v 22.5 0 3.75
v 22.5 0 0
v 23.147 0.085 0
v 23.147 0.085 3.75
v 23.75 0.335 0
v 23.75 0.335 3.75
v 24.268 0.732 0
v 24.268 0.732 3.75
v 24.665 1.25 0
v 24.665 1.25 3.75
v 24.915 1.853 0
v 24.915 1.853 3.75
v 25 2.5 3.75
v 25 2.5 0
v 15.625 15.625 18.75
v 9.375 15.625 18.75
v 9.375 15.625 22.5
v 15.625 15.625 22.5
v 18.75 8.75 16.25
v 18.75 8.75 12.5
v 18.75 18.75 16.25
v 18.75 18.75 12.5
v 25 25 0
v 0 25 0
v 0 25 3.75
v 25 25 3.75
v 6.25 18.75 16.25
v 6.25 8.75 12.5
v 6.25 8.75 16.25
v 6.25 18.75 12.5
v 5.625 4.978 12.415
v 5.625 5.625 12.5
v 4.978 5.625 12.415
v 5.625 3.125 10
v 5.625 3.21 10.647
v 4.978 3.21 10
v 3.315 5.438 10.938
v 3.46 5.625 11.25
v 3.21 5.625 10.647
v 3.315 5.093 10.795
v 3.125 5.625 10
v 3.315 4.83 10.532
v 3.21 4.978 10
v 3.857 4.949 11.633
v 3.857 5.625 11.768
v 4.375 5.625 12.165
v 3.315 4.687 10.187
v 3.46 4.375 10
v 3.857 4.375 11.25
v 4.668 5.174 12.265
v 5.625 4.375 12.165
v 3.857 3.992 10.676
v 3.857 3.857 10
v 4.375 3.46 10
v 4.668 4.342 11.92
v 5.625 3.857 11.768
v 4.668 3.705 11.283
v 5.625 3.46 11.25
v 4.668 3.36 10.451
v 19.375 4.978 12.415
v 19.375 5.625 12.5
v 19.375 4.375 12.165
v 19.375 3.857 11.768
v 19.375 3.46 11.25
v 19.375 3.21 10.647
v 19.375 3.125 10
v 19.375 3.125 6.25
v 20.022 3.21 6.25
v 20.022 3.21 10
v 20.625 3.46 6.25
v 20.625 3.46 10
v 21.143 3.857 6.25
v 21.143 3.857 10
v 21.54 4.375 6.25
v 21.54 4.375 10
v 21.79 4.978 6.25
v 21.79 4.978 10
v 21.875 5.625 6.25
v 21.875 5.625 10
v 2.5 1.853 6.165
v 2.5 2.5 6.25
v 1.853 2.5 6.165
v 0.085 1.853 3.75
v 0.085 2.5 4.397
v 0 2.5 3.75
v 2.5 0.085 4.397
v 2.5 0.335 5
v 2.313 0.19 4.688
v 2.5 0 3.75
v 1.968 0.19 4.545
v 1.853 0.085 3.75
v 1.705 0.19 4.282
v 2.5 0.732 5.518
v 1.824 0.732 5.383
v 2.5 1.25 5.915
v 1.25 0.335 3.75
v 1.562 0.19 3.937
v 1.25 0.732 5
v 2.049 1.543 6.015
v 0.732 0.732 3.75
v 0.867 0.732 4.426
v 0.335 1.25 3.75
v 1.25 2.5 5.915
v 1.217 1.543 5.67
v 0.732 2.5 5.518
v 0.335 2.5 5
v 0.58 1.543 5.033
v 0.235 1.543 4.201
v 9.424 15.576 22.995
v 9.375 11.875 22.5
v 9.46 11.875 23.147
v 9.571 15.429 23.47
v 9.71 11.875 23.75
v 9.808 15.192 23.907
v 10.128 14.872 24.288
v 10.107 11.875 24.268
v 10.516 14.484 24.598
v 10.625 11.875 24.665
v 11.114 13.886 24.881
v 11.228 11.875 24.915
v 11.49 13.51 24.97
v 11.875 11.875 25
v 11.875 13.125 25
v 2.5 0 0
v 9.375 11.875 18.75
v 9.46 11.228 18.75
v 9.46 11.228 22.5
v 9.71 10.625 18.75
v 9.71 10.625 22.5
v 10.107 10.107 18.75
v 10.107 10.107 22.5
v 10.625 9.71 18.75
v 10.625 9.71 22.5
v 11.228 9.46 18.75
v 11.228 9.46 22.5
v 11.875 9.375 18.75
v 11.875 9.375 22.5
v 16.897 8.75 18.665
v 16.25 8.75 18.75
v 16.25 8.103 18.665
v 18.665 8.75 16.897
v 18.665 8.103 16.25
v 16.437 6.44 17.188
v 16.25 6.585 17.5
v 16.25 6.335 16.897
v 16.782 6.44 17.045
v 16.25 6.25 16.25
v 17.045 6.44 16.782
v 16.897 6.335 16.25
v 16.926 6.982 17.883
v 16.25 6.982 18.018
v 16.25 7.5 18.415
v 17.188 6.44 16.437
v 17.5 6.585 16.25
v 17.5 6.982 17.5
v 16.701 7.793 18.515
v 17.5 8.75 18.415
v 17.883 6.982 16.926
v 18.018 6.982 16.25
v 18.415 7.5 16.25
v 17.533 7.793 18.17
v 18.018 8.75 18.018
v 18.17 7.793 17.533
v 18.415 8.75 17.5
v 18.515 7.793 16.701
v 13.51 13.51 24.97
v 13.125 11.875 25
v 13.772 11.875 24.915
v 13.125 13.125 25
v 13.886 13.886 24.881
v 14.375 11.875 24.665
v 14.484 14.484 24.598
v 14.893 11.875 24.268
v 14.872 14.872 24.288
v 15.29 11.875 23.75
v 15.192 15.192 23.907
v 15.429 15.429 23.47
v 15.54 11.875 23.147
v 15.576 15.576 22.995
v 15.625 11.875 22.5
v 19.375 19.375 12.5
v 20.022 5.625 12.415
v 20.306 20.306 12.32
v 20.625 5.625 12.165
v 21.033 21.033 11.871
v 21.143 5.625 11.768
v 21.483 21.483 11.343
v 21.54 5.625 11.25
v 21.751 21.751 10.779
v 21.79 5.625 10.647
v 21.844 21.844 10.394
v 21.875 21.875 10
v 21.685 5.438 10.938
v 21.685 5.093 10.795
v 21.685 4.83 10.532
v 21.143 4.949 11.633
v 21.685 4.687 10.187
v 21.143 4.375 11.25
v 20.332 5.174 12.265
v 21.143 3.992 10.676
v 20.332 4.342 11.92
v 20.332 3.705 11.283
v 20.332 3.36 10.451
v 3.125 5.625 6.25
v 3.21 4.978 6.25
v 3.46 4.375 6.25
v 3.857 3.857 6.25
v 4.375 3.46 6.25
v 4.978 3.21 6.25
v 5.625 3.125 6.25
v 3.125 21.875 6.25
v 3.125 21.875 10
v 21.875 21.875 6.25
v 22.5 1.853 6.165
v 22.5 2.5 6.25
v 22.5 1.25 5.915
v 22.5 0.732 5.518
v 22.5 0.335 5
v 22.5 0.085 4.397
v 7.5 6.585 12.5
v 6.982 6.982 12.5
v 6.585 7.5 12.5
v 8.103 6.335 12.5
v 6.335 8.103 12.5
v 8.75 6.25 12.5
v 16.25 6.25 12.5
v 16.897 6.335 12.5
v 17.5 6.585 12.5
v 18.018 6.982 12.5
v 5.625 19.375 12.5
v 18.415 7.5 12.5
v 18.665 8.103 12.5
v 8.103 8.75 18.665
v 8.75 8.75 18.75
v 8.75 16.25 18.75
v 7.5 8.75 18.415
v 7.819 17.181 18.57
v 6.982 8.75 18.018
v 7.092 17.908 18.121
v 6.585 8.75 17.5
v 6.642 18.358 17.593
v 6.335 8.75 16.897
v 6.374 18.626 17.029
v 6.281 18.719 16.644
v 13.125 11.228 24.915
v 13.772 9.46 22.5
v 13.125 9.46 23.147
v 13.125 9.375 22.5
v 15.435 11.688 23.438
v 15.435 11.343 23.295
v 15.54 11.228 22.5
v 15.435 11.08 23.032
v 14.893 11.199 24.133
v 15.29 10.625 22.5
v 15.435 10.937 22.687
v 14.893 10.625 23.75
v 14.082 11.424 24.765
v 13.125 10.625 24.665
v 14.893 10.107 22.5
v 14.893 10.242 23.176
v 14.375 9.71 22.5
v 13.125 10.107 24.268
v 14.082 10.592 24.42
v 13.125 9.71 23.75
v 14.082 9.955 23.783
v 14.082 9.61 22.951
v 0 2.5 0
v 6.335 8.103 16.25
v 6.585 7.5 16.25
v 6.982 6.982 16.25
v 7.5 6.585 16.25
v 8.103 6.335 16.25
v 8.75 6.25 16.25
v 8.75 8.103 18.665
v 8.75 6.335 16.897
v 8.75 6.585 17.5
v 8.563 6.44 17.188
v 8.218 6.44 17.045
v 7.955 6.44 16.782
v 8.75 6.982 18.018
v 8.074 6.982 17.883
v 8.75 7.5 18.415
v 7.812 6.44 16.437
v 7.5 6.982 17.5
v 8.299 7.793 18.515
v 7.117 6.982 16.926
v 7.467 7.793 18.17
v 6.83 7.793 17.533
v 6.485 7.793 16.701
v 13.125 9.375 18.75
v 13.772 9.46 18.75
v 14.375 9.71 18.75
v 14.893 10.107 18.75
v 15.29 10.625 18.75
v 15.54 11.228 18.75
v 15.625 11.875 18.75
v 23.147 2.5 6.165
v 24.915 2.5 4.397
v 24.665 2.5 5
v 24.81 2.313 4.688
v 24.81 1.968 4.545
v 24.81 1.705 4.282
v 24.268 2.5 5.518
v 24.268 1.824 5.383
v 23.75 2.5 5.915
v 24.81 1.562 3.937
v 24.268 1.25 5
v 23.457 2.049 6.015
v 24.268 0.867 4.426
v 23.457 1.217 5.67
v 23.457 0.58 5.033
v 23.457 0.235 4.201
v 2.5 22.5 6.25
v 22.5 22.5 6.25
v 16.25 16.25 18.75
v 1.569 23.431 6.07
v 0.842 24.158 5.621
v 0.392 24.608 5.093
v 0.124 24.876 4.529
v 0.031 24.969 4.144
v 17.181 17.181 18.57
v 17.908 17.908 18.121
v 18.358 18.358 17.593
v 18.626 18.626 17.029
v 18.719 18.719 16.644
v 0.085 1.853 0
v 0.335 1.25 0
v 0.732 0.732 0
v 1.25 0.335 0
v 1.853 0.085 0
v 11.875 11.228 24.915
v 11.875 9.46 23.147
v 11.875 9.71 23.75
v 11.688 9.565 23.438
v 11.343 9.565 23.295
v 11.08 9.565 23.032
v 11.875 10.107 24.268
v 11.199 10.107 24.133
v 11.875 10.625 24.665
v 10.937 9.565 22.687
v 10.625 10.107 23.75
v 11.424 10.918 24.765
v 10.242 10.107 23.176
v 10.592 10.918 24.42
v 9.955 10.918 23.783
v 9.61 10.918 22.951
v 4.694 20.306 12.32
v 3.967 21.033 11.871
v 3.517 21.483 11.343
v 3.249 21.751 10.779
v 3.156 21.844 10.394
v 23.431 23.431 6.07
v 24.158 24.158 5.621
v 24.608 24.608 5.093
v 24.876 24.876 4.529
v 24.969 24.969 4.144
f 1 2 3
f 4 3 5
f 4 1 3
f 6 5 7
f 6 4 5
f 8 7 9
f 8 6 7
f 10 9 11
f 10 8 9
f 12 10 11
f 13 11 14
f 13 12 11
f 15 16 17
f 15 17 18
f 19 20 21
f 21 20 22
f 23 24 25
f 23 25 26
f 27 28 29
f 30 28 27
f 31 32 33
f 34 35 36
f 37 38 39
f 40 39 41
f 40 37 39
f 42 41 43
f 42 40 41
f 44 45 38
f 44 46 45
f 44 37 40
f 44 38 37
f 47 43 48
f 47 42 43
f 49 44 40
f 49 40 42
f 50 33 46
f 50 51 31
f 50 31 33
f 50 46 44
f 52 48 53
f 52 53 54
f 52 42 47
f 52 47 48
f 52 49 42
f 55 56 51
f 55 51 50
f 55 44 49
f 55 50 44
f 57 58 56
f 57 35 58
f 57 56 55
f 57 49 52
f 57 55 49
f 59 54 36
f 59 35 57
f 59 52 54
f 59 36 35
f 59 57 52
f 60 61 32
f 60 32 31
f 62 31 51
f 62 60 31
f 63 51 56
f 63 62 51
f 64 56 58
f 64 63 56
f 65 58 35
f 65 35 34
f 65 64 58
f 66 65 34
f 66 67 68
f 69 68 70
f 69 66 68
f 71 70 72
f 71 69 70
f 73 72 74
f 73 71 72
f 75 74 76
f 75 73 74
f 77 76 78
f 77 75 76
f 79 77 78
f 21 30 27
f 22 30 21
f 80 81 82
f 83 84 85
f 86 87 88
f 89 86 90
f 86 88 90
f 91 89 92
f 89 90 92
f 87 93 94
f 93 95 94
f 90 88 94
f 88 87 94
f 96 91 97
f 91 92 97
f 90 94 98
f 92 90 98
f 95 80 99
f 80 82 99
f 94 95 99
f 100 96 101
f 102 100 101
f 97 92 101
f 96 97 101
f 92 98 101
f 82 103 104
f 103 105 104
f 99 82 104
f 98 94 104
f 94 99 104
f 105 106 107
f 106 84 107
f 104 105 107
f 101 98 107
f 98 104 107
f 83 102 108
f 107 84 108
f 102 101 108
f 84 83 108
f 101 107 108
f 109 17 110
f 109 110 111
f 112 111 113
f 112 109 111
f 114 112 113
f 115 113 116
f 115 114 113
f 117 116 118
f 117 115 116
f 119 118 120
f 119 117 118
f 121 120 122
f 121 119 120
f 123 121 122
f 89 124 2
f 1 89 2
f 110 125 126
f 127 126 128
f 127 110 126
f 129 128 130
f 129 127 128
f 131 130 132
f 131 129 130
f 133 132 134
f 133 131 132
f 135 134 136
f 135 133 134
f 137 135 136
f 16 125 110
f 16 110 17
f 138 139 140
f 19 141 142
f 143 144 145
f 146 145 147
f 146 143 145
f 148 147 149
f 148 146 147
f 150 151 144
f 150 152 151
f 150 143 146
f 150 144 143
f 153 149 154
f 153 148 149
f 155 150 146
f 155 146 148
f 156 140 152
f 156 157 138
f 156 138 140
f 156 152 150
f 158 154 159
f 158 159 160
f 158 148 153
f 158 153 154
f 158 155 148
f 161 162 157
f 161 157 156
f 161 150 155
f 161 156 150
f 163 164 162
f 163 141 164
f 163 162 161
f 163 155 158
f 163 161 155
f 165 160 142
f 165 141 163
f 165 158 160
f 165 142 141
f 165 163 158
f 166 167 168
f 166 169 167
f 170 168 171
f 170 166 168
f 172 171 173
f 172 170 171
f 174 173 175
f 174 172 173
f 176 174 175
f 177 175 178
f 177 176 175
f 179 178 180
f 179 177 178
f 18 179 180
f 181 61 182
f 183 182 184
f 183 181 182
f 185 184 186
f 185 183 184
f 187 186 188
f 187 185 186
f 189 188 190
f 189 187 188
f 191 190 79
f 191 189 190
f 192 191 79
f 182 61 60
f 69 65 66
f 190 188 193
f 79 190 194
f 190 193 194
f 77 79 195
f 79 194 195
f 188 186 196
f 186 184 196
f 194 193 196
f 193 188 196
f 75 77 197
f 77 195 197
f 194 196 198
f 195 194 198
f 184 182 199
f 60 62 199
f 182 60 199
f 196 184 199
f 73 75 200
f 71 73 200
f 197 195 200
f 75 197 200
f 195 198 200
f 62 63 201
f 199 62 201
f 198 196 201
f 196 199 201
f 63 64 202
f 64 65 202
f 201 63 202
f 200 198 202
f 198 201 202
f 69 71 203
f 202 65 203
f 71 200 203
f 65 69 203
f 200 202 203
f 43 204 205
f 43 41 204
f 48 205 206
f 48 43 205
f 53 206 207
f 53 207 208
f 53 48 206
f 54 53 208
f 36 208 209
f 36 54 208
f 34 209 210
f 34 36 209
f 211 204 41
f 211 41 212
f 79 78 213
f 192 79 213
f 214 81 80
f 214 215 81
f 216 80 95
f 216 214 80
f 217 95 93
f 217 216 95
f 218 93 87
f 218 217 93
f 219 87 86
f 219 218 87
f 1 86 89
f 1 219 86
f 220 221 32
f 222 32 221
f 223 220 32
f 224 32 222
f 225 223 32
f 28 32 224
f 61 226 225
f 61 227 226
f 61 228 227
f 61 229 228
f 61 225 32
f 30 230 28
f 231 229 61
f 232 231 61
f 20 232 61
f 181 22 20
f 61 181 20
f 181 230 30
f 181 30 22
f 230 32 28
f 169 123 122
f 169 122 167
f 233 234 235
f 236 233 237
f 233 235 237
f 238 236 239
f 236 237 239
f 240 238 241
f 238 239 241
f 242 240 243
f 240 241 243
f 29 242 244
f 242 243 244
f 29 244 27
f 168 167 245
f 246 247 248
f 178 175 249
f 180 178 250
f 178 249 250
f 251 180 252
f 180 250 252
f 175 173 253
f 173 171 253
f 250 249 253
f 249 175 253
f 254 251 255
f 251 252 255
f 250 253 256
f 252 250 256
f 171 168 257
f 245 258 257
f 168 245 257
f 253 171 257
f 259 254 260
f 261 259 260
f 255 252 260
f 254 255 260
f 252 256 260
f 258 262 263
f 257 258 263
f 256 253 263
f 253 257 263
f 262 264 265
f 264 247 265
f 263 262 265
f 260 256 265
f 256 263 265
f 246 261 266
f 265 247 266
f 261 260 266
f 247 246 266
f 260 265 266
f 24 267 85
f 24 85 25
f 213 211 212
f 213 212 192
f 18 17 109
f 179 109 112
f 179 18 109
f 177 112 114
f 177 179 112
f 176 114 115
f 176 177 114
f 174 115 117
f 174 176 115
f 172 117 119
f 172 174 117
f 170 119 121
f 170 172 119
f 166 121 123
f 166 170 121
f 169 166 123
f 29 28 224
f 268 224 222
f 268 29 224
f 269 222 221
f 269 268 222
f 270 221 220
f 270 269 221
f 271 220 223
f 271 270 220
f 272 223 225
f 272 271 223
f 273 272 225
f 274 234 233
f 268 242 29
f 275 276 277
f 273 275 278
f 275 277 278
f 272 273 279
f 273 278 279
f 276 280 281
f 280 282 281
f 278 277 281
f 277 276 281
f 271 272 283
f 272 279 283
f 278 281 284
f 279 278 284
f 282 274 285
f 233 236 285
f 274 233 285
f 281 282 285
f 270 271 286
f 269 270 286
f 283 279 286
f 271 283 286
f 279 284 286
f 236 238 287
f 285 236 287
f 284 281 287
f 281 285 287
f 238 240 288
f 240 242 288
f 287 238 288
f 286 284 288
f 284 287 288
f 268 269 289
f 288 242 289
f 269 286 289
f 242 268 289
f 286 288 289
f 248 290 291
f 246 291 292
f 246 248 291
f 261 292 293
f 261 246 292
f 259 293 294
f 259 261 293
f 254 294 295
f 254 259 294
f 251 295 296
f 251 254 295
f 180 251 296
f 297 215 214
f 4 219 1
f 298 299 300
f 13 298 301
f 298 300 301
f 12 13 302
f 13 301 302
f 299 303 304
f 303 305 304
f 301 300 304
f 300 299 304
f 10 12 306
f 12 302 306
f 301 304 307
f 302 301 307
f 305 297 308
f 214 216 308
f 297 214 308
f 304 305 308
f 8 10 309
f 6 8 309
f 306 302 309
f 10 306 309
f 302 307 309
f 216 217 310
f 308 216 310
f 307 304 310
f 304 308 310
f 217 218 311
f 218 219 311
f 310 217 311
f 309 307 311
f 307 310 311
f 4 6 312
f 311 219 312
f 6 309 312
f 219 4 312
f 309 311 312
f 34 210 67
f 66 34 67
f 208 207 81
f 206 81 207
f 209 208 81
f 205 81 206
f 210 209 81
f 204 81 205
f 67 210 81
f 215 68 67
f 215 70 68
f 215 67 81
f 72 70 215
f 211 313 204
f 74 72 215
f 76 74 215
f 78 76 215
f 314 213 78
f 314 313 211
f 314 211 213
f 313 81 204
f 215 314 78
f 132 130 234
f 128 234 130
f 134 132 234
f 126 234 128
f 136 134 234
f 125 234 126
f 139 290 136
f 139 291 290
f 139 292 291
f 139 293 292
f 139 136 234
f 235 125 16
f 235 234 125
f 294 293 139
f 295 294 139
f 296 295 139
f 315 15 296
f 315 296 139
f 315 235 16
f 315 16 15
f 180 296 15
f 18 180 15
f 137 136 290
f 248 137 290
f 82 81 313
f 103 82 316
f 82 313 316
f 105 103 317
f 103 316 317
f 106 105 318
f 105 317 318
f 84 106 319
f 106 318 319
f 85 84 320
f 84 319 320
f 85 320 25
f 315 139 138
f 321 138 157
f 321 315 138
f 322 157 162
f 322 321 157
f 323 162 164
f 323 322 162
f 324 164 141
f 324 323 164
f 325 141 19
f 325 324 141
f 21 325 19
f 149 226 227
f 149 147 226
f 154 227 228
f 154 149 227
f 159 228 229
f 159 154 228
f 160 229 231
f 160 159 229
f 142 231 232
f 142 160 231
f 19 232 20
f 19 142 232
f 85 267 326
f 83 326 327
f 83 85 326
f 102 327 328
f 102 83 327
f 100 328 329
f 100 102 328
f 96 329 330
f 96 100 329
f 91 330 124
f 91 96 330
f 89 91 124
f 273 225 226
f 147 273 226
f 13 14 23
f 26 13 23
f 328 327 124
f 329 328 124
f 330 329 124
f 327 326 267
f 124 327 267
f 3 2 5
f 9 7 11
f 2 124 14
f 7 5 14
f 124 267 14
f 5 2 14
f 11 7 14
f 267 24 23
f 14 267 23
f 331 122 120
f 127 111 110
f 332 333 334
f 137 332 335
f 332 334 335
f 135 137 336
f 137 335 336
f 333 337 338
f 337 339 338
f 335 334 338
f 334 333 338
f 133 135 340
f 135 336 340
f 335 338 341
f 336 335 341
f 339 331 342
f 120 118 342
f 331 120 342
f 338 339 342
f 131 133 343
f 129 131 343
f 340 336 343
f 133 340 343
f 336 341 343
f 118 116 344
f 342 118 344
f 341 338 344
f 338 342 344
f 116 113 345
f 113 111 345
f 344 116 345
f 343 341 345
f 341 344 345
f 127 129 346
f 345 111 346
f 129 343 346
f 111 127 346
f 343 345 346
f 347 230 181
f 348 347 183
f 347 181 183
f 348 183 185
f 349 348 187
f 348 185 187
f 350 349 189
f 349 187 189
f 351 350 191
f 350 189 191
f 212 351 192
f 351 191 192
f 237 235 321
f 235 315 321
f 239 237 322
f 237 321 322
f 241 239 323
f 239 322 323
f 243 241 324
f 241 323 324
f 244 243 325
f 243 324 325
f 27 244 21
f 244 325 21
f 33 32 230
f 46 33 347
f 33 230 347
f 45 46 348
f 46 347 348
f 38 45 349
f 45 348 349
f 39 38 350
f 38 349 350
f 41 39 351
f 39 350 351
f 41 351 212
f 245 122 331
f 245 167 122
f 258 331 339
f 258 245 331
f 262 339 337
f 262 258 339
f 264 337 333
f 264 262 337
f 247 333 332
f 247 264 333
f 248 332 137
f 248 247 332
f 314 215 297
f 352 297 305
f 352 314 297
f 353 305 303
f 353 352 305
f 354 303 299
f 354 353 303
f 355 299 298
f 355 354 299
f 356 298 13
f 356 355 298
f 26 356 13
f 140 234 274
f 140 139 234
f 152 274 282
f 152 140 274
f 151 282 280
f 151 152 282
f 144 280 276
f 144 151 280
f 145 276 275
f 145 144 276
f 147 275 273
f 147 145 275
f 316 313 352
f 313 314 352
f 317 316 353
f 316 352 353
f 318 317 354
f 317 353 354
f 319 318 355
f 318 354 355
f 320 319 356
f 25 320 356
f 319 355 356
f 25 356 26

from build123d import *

# Parameters (mm, degrees)
F1_W     = 25
F1_H     = 25
F1_W_2   = 18.75
F1_H_2   = 18.75
F2_DEPTH = 6.25
F1_W_3   = 12.5
F1_H_3   = 12.5
F3_DEPTH = 12.5
F1_W_4   = 6.25
F1_H_4   = 6.25
F4_DEPTH = 18.75
F5_DEPTH = 25
F6_R     = 2.5


with BuildPart() as f2:
    # F1 (on Top) → F2 (new body)
    with BuildSketch(Plane.XY):
        with Locations((12.5, 12.5)):
            Rectangle(F1_W, F1_H)
        with Locations((12.5, 12.5)):
            Rectangle(F1_W_2, F1_H_2, mode=Mode.SUBTRACT)
    extrude(amount=F2_DEPTH)

    # F1 (on Top) → F3 (join)
    with BuildSketch(Plane.XY):
        with Locations((12.5, 12.5)):
            Rectangle(F1_W_2, F1_H_2)
        with Locations((12.5, 12.5)):
            Rectangle(F1_W_3, F1_H_3, mode=Mode.SUBTRACT)
    extrude(amount=F3_DEPTH)

    # F1 (on Top) → F4 (join)
    with BuildSketch(Plane.XY):
        with Locations((12.5, 12.5)):
            Rectangle(F1_W_3, F1_H_3)
        with Locations((12.5, 12.5)):
            Rectangle(F1_W_4, F1_H_4, mode=Mode.SUBTRACT)
    extrude(amount=F4_DEPTH)

    # F1 (on Top) → F5 (join)
    with BuildSketch(Plane.XY):
        with Locations((12.5, 12.5)):
            Rectangle(F1_W_4, F1_H_4)
    extrude(amount=F5_DEPTH)

    # F6
    f6_edges = [f2.edges().sort_by_distance(p)[0] for p in [
        (18.75, 12.5, 18.75),
        (12.5, 18.75, 18.75),
        (6.25, 12.5, 18.75),
        (12.5, 6.25, 18.75),
        (12.5, 15.625, 25),
        (9.375, 12.5, 25),
        (12.5, 9.375, 25),
        (15.625, 12.5, 25),
        (12.5, 3.125, 12.5),
        (21.875, 12.5, 12.5),
        (12.5, 21.875, 12.5),
        (3.125, 12.5, 12.5),
        (12.5, 25, 6.25),
        (0, 12.5, 6.25),
        (12.5, 0, 6.25),
        (15.625, 9.375, 21.875),
        (9.375, 9.375, 21.875),
        (6.25, 6.25, 15.625),
        (18.75, 6.25, 15.625),
        (3.125, 3.125, 9.375),
        (21.875, 3.125, 9.375),
        (25, 12.5, 6.25),
        (25, 0, 3.125),
        (0, 0, 3.125),
    ]]
    fillet(f6_edges, radius=F6_R)


solid = f2.part
